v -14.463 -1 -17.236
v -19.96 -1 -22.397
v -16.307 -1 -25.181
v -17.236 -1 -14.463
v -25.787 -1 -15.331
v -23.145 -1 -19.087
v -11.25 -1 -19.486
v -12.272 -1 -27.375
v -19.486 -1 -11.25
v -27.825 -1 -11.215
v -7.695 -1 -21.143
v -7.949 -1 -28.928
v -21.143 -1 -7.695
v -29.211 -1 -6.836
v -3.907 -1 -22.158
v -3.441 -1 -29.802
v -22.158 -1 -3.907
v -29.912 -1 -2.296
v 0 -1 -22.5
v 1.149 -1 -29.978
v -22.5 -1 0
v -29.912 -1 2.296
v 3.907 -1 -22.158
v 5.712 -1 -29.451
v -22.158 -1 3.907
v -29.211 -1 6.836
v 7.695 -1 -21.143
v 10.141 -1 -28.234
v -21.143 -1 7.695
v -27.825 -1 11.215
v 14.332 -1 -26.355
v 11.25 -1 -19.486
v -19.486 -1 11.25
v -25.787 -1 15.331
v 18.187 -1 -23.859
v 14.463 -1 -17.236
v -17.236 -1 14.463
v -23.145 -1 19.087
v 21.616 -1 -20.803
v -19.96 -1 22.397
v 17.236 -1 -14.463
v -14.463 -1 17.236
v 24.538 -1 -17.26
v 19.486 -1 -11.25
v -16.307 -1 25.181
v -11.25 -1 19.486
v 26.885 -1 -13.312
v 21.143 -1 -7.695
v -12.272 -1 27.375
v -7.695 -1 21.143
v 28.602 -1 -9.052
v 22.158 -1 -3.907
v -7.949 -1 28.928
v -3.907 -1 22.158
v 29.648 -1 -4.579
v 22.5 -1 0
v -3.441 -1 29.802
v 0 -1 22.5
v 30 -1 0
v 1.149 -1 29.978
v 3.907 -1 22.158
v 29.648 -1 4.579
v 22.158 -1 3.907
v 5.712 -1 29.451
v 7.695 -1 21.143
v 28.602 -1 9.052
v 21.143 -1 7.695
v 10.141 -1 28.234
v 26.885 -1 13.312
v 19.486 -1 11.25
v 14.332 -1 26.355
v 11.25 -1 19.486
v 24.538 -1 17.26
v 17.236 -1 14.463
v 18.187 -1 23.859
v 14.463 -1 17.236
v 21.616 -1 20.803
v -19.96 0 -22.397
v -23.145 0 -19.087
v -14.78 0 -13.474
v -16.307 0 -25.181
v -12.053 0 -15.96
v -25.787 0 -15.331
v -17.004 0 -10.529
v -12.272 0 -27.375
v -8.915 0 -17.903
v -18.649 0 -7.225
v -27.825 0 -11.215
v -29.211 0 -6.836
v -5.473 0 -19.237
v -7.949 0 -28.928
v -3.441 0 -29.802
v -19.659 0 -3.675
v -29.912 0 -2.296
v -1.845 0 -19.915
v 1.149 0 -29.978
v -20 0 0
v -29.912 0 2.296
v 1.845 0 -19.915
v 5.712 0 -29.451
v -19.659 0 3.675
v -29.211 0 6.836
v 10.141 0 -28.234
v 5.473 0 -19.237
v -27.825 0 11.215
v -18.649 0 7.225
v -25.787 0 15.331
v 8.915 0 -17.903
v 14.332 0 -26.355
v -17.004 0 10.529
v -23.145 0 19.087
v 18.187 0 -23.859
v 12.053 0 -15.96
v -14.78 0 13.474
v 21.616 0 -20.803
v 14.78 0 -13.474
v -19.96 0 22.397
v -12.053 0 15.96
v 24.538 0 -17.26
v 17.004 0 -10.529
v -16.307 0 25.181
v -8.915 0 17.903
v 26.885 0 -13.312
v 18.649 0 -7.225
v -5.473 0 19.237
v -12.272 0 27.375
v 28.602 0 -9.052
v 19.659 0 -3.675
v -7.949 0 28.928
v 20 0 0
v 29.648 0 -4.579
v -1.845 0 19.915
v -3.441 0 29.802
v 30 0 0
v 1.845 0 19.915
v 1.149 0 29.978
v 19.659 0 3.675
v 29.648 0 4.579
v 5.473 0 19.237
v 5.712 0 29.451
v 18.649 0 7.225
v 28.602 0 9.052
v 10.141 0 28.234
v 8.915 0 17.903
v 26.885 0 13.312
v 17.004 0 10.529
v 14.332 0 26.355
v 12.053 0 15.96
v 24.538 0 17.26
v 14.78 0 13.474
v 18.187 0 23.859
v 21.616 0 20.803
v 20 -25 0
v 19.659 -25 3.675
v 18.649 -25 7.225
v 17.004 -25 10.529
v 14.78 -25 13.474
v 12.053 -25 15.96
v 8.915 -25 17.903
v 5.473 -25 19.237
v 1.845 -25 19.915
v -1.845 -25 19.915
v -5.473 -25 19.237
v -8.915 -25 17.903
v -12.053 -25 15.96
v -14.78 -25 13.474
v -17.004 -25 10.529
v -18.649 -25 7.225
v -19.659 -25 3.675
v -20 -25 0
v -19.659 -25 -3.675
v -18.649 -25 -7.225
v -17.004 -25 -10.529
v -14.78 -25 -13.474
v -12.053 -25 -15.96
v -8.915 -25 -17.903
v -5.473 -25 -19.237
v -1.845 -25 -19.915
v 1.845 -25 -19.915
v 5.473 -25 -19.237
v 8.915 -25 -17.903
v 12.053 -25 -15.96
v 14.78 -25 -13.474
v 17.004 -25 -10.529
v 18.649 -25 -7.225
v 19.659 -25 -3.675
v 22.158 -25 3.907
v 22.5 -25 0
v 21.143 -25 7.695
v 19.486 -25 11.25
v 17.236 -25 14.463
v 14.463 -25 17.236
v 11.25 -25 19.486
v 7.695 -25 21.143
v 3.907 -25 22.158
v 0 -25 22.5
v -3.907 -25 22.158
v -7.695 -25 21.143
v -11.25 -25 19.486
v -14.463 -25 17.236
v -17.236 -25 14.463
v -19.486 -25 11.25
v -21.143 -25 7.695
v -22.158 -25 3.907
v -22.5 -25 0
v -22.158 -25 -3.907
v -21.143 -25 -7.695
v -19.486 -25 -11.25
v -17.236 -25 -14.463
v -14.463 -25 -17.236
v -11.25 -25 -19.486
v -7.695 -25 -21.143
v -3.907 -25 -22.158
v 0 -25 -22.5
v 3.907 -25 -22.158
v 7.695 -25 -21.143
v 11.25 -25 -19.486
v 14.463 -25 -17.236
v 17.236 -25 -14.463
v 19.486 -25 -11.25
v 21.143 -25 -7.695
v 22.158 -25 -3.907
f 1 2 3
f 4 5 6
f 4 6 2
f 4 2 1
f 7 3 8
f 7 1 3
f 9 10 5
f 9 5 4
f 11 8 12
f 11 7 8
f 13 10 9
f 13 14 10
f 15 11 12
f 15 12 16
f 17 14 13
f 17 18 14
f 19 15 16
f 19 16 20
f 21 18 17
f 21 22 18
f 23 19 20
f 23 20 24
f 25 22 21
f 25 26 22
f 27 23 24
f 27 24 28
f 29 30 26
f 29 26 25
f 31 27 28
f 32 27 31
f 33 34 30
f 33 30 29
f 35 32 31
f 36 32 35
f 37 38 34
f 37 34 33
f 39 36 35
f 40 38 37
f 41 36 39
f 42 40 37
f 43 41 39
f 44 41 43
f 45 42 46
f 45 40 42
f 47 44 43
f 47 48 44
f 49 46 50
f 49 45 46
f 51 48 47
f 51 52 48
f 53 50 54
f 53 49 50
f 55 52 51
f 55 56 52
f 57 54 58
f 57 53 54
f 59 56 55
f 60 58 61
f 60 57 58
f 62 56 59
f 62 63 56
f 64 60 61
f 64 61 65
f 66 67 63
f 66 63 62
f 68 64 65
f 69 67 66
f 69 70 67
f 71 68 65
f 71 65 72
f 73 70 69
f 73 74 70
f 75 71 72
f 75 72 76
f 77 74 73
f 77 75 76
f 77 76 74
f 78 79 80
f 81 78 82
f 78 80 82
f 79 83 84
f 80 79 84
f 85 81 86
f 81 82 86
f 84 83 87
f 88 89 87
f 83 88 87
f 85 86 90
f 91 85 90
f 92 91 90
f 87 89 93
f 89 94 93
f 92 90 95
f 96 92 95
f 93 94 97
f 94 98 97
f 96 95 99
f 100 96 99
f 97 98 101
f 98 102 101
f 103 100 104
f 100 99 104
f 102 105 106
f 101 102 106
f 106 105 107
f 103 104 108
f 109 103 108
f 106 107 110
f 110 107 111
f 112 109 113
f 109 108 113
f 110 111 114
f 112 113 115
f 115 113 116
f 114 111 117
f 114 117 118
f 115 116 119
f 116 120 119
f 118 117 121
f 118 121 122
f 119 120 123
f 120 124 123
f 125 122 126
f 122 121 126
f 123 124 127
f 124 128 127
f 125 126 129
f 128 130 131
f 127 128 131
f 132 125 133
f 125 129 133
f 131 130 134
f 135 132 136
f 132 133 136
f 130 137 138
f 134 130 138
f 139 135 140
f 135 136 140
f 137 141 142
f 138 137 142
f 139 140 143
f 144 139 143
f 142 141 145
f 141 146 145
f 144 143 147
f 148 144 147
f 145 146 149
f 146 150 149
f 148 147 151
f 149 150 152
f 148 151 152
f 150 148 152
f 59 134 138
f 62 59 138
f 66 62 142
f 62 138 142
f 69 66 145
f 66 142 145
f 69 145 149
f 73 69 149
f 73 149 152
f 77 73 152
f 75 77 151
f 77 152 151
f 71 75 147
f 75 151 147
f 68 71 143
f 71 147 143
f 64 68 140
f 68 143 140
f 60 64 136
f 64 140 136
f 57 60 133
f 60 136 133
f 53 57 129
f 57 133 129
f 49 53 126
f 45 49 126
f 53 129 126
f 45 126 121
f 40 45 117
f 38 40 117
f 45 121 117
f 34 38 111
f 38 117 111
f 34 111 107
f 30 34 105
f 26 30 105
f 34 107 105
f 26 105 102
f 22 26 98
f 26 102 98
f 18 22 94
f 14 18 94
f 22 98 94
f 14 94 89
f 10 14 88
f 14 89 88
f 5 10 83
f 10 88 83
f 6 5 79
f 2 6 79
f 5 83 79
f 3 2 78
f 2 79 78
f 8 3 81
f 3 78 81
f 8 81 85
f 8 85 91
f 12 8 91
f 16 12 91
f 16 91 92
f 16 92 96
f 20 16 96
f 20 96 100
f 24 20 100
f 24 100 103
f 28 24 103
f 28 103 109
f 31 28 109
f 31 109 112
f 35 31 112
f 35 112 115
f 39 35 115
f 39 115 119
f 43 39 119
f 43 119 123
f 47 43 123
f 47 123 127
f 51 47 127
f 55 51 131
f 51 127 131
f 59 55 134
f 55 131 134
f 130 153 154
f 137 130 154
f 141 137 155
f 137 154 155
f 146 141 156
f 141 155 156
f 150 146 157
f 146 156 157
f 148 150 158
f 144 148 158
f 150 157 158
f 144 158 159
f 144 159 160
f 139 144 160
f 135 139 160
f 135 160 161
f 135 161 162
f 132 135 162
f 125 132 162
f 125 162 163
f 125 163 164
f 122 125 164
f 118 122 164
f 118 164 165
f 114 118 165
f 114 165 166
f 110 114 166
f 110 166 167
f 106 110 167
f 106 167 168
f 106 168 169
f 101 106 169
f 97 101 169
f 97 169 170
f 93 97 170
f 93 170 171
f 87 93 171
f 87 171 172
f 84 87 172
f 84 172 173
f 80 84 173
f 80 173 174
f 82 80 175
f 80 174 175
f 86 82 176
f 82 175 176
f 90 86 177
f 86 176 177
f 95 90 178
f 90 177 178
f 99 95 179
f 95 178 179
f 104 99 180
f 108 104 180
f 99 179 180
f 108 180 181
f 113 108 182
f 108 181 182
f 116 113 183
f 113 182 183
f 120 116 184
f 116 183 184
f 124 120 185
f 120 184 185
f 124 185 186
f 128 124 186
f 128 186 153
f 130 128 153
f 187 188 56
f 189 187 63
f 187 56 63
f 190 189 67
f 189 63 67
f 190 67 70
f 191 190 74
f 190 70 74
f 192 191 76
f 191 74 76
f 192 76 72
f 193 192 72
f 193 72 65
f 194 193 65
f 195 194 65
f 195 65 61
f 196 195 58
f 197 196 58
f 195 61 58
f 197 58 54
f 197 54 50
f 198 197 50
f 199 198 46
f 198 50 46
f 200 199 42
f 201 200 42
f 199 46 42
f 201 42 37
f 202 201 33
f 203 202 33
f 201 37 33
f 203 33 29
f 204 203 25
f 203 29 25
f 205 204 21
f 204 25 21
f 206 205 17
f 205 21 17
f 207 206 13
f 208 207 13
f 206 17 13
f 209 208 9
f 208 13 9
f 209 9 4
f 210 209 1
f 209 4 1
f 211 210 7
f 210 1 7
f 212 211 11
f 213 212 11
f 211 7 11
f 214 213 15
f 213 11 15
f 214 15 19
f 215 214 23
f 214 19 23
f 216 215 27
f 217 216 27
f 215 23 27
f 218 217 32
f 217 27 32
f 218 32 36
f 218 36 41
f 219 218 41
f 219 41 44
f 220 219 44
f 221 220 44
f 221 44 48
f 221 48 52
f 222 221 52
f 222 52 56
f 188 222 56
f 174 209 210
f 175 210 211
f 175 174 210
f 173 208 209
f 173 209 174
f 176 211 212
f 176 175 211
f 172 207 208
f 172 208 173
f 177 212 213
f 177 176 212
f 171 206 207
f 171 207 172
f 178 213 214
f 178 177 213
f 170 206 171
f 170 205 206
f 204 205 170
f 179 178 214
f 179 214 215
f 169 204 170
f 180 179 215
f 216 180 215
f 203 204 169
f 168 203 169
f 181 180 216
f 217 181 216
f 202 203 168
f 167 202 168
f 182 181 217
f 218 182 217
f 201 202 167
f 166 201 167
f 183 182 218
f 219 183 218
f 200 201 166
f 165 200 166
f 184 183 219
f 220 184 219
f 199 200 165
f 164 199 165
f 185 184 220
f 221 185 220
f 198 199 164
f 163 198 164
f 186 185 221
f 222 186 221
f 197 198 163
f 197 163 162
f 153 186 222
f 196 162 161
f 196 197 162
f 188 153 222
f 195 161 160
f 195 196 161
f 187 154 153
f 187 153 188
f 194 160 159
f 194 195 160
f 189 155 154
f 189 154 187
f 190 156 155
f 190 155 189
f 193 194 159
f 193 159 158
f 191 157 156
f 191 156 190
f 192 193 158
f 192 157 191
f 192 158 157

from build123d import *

# Parameters (mm, degrees)
F0_R     = 30
F1_DEPTH = 1
F2_R     = 22.5
F3_DEPTH = 24
F5_R     = 20
F6_DEPTH = 25.001


# Not quite as in the source:
# - the program builds the solid bodies; features that only make, move or delete a surface that nothing else refers to are left out


with BuildPart() as f1:
    # F0 (on Front) → F1 (new body)
    with BuildSketch(Plane.XZ):
        Circle(F0_R)
    extrude(amount=F1_DEPTH)

    # F2 (on face) → F3 (join)
    with BuildSketch(Plane.XZ.offset(1)):
        Circle(F2_R)
    extrude(amount=F3_DEPTH)

    # F5 (on face) → F6 (cut, through all)
    with BuildSketch(Plane.XZ.offset(25)):
        Circle(F5_R)
    extrude(amount=-F6_DEPTH, mode=Mode.SUBTRACT)


solid = f1.part
